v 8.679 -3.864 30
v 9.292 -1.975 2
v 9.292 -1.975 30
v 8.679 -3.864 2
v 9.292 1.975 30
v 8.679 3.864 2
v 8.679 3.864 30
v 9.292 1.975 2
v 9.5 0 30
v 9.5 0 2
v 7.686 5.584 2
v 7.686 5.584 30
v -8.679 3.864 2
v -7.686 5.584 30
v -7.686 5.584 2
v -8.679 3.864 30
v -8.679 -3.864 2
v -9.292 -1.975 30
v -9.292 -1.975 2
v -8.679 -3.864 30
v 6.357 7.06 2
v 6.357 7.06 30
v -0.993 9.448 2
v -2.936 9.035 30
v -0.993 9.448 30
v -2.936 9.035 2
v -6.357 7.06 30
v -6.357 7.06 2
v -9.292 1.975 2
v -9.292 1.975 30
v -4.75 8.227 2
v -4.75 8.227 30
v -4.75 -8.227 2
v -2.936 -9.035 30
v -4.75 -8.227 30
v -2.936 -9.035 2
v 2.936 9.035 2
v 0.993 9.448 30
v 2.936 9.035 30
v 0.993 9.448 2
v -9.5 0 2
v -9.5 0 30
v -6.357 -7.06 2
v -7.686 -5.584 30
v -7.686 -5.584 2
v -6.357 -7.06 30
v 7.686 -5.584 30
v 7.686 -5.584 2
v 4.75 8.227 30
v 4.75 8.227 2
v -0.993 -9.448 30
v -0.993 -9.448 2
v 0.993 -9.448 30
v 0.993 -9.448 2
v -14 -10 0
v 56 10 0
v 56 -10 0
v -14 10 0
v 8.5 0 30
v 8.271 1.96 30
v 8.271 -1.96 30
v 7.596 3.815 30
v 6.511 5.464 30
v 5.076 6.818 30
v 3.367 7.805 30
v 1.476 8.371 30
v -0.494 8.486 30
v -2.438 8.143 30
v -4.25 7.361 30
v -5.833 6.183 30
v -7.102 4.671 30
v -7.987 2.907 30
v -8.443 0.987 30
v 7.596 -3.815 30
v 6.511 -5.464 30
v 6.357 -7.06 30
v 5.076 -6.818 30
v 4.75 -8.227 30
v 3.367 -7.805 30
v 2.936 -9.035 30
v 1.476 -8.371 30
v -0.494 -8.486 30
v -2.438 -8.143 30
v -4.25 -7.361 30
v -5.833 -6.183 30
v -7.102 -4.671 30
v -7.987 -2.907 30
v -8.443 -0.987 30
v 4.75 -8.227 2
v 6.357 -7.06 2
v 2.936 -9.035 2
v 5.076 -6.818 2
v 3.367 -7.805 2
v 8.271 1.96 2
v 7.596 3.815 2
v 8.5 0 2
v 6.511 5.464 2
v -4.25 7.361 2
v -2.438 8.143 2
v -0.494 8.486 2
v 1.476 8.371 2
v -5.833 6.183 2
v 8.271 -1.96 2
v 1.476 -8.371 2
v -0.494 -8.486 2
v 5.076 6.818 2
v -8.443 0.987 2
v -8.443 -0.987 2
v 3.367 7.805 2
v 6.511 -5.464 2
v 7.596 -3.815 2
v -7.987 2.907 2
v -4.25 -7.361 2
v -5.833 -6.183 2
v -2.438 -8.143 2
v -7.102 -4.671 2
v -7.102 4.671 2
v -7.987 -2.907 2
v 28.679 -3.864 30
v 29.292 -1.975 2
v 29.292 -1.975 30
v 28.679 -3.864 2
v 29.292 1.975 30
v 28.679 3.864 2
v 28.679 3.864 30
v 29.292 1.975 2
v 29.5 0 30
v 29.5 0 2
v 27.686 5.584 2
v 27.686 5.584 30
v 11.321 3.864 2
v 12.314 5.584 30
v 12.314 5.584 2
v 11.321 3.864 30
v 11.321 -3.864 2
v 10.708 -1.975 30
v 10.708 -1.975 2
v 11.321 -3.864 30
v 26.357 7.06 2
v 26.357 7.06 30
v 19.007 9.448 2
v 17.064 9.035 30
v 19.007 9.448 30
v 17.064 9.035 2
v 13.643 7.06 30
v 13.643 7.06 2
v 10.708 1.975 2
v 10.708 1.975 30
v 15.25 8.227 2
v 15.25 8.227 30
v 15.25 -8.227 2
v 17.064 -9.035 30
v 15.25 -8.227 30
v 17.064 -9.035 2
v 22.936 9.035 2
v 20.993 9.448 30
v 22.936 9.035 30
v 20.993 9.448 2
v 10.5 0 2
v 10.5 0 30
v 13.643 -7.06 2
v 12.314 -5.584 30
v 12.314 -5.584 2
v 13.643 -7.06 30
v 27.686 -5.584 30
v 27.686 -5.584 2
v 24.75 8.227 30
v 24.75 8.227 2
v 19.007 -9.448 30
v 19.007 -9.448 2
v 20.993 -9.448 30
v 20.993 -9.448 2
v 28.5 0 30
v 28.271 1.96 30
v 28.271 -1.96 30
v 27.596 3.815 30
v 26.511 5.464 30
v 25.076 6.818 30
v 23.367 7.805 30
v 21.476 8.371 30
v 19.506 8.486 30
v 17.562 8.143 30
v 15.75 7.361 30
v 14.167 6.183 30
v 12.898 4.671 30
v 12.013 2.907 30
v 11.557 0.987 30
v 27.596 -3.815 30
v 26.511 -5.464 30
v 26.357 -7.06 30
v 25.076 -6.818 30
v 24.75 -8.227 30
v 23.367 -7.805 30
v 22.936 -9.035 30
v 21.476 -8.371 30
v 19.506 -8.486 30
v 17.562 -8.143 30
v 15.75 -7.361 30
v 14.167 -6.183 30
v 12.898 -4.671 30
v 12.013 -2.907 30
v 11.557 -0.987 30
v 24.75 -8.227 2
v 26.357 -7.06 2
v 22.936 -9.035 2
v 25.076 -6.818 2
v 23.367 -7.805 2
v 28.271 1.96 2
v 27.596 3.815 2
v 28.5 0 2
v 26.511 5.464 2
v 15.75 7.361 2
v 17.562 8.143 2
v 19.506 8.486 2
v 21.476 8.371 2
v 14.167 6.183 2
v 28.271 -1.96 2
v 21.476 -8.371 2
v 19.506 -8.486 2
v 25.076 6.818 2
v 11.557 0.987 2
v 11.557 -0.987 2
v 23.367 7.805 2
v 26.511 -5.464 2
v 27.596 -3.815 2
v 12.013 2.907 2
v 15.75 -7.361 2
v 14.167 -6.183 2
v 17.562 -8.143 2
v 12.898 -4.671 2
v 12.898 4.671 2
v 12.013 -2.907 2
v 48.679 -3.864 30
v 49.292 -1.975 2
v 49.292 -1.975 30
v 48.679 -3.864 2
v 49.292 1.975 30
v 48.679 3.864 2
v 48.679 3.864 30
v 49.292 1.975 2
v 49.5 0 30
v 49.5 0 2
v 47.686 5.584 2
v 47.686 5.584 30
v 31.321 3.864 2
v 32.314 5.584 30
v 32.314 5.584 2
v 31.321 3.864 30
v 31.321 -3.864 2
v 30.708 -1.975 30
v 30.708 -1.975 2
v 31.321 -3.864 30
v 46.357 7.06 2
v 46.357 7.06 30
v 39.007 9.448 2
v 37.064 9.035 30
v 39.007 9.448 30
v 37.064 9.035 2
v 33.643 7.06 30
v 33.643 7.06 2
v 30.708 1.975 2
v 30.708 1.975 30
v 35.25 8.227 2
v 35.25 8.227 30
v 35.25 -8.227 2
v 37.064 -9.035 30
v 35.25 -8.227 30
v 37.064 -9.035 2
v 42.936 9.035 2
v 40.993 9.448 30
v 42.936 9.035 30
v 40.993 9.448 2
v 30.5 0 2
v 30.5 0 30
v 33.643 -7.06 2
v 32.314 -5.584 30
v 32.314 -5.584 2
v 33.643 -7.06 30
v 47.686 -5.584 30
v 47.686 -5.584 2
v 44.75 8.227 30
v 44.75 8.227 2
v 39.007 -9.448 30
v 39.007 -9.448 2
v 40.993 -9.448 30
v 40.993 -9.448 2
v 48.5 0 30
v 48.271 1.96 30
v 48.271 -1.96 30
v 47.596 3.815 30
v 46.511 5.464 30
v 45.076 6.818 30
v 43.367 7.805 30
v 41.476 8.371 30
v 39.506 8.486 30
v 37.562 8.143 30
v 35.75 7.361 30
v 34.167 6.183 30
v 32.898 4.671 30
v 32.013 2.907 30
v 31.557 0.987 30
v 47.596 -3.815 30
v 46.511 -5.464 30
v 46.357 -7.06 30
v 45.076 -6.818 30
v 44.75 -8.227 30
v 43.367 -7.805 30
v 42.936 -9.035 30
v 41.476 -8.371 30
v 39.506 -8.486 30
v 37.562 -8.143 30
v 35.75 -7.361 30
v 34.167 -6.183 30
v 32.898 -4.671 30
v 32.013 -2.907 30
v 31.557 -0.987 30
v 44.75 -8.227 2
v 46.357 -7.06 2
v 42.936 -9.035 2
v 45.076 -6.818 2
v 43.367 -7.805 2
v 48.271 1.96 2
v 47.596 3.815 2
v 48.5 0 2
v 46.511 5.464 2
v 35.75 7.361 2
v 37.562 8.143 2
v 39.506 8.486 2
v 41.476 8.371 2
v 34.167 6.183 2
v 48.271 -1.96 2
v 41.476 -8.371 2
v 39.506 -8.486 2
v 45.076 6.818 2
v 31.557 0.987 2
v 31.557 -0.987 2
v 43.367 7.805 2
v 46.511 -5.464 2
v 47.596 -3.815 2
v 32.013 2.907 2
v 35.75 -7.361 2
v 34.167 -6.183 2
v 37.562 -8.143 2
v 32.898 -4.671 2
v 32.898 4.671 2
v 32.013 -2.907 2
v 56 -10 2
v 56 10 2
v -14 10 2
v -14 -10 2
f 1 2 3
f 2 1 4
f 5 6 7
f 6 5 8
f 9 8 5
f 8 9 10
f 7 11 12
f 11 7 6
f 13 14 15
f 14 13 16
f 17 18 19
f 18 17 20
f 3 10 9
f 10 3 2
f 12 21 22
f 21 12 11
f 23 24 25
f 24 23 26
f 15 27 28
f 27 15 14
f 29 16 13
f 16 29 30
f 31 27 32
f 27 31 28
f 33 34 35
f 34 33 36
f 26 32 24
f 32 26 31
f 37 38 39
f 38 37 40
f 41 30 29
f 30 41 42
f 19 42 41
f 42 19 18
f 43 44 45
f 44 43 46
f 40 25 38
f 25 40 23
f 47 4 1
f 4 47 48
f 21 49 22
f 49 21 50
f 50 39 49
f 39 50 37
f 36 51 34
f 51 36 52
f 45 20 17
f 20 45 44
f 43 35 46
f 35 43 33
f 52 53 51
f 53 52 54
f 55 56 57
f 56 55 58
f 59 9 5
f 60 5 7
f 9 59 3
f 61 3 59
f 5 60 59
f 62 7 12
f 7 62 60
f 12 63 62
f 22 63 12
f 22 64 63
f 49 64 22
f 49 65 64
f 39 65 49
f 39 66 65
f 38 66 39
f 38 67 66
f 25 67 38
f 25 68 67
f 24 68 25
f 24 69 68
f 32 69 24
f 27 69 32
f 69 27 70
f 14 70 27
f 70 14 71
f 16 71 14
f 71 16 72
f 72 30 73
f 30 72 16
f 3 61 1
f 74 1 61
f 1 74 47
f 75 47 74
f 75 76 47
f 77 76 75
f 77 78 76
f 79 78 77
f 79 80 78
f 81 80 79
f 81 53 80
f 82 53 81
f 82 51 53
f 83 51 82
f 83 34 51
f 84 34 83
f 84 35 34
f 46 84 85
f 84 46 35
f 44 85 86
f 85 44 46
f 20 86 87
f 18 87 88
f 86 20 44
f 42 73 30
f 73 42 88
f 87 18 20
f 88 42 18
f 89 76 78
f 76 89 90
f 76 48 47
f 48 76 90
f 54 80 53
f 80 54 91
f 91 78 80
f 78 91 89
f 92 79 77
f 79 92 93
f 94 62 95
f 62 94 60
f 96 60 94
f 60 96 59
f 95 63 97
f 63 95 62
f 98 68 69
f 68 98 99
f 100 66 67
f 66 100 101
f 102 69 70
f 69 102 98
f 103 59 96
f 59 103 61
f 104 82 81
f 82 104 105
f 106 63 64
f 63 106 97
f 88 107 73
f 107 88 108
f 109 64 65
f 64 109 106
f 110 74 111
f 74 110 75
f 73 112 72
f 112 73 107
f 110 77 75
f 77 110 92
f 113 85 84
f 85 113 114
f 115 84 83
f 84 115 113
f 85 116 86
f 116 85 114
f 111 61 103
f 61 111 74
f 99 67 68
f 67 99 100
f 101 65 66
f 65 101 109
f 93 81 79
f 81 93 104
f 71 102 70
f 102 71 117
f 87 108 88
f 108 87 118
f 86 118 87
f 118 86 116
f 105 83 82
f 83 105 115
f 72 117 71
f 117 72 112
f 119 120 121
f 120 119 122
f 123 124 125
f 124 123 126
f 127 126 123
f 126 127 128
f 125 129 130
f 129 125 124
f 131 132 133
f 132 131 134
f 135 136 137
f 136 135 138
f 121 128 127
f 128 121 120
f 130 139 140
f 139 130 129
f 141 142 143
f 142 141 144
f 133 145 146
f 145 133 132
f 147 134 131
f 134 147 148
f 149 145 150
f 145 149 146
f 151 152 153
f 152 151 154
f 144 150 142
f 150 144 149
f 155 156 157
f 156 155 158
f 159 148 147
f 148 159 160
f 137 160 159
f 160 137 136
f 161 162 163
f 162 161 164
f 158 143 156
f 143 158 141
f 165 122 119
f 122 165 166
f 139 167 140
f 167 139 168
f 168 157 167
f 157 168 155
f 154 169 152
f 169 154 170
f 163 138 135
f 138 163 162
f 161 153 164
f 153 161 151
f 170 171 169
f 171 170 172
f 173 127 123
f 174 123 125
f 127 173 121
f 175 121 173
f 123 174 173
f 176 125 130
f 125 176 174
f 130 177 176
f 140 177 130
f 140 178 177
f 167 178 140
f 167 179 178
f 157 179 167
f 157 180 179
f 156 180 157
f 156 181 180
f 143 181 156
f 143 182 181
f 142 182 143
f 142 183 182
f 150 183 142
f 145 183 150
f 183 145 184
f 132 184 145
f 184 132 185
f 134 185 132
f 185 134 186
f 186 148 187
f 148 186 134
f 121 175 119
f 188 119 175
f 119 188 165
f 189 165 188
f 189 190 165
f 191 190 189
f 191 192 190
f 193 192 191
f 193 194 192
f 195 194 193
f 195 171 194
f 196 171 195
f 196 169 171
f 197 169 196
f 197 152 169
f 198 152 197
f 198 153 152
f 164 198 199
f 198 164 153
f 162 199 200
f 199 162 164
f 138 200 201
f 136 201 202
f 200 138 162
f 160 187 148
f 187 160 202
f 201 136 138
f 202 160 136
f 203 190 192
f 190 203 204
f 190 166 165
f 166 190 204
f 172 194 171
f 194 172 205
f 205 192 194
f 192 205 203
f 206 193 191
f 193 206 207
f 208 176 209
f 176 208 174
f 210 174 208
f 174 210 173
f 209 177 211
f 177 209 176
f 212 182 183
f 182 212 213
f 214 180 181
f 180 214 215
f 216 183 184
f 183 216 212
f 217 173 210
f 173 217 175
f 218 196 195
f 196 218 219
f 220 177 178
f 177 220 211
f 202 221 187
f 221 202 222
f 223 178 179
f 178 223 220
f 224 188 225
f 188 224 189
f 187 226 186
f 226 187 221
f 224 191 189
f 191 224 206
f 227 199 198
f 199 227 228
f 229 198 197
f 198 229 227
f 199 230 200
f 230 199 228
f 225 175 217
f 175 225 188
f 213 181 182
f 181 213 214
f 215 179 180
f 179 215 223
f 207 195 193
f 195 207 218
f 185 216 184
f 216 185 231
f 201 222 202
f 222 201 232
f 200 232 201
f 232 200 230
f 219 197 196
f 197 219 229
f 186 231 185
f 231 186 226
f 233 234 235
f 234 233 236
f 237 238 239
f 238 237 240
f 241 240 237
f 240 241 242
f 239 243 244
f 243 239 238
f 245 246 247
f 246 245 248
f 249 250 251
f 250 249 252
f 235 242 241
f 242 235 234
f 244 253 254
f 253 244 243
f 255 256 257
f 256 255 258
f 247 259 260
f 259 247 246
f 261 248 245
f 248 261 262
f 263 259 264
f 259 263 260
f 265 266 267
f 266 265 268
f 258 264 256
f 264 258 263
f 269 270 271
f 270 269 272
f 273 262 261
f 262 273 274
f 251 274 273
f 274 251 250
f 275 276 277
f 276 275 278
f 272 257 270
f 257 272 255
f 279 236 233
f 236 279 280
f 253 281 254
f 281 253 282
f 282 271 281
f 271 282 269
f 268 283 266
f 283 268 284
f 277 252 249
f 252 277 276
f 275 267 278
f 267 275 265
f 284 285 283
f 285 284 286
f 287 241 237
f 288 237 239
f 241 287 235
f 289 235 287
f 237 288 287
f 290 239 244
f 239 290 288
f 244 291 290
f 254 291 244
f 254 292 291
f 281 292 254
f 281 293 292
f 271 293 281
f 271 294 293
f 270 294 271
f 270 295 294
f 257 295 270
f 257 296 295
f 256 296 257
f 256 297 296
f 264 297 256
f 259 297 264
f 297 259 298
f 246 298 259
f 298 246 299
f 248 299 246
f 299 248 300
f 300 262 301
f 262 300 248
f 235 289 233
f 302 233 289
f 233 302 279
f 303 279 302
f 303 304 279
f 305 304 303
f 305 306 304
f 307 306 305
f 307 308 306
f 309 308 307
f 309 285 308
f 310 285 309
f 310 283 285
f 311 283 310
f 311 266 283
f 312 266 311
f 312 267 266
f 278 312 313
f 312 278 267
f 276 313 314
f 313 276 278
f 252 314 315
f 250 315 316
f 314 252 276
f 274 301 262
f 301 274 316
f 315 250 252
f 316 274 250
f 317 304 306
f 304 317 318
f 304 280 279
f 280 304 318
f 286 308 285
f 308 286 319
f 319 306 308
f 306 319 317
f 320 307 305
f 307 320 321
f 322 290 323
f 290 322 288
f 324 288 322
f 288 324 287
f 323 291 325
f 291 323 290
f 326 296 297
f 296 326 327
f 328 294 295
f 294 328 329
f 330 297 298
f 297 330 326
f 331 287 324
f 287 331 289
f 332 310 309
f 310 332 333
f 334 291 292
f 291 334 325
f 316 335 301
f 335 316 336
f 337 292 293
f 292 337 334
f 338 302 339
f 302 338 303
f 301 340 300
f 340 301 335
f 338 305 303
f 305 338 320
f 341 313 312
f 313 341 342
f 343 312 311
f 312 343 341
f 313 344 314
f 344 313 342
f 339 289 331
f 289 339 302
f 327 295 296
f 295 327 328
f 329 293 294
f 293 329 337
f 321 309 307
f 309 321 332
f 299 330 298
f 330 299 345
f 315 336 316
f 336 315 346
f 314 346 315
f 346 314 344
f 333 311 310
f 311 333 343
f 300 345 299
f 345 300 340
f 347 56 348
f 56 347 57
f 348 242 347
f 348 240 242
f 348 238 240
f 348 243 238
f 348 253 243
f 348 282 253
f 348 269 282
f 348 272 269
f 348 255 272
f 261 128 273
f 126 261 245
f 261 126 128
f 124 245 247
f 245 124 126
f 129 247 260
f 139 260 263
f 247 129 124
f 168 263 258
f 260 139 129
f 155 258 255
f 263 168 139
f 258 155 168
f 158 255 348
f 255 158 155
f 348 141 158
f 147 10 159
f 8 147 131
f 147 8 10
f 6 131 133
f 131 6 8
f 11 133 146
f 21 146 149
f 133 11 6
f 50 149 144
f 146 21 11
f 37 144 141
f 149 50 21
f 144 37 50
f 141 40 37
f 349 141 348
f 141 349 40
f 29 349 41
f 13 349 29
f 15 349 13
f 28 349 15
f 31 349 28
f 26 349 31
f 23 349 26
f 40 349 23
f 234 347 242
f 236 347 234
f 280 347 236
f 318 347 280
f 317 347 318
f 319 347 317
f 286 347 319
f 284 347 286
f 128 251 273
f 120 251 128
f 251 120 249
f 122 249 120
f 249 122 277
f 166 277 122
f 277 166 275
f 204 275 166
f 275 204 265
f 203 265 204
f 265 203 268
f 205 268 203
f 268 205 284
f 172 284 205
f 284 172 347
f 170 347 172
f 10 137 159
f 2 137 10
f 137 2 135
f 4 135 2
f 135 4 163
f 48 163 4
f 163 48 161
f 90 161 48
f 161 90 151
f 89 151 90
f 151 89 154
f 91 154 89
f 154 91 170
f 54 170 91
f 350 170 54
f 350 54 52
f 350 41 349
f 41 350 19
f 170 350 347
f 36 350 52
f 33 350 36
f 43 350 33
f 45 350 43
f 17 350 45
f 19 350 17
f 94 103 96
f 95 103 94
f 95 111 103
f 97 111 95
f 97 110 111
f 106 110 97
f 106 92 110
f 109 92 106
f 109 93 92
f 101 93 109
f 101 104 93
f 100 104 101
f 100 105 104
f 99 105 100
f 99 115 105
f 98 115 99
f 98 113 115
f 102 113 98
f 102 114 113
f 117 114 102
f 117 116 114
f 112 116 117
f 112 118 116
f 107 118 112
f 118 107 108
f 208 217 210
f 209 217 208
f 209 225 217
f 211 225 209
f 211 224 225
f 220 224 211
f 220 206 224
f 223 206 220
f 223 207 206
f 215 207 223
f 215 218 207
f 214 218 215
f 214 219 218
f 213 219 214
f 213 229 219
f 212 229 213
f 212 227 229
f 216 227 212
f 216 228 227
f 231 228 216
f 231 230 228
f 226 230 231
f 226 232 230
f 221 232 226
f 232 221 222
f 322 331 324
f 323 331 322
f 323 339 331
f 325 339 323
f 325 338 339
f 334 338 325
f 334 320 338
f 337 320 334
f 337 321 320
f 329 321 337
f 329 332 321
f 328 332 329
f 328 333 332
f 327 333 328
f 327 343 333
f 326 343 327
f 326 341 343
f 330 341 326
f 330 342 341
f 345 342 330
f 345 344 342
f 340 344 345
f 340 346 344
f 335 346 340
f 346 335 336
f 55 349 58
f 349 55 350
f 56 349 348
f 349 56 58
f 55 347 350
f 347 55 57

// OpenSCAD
for(i = [0:2])
{
  translate(i*[20, 0, 0])
    difference()
    {
      cylinder(r=(17+2)/2, h=30);
      cylinder(r=(17+0)/2, h=31);
    }
}

translate([-(17+1)/2-5,  -(17+1)/2-1, 0])
  cube([20*3+2*5, 20, 2]);
